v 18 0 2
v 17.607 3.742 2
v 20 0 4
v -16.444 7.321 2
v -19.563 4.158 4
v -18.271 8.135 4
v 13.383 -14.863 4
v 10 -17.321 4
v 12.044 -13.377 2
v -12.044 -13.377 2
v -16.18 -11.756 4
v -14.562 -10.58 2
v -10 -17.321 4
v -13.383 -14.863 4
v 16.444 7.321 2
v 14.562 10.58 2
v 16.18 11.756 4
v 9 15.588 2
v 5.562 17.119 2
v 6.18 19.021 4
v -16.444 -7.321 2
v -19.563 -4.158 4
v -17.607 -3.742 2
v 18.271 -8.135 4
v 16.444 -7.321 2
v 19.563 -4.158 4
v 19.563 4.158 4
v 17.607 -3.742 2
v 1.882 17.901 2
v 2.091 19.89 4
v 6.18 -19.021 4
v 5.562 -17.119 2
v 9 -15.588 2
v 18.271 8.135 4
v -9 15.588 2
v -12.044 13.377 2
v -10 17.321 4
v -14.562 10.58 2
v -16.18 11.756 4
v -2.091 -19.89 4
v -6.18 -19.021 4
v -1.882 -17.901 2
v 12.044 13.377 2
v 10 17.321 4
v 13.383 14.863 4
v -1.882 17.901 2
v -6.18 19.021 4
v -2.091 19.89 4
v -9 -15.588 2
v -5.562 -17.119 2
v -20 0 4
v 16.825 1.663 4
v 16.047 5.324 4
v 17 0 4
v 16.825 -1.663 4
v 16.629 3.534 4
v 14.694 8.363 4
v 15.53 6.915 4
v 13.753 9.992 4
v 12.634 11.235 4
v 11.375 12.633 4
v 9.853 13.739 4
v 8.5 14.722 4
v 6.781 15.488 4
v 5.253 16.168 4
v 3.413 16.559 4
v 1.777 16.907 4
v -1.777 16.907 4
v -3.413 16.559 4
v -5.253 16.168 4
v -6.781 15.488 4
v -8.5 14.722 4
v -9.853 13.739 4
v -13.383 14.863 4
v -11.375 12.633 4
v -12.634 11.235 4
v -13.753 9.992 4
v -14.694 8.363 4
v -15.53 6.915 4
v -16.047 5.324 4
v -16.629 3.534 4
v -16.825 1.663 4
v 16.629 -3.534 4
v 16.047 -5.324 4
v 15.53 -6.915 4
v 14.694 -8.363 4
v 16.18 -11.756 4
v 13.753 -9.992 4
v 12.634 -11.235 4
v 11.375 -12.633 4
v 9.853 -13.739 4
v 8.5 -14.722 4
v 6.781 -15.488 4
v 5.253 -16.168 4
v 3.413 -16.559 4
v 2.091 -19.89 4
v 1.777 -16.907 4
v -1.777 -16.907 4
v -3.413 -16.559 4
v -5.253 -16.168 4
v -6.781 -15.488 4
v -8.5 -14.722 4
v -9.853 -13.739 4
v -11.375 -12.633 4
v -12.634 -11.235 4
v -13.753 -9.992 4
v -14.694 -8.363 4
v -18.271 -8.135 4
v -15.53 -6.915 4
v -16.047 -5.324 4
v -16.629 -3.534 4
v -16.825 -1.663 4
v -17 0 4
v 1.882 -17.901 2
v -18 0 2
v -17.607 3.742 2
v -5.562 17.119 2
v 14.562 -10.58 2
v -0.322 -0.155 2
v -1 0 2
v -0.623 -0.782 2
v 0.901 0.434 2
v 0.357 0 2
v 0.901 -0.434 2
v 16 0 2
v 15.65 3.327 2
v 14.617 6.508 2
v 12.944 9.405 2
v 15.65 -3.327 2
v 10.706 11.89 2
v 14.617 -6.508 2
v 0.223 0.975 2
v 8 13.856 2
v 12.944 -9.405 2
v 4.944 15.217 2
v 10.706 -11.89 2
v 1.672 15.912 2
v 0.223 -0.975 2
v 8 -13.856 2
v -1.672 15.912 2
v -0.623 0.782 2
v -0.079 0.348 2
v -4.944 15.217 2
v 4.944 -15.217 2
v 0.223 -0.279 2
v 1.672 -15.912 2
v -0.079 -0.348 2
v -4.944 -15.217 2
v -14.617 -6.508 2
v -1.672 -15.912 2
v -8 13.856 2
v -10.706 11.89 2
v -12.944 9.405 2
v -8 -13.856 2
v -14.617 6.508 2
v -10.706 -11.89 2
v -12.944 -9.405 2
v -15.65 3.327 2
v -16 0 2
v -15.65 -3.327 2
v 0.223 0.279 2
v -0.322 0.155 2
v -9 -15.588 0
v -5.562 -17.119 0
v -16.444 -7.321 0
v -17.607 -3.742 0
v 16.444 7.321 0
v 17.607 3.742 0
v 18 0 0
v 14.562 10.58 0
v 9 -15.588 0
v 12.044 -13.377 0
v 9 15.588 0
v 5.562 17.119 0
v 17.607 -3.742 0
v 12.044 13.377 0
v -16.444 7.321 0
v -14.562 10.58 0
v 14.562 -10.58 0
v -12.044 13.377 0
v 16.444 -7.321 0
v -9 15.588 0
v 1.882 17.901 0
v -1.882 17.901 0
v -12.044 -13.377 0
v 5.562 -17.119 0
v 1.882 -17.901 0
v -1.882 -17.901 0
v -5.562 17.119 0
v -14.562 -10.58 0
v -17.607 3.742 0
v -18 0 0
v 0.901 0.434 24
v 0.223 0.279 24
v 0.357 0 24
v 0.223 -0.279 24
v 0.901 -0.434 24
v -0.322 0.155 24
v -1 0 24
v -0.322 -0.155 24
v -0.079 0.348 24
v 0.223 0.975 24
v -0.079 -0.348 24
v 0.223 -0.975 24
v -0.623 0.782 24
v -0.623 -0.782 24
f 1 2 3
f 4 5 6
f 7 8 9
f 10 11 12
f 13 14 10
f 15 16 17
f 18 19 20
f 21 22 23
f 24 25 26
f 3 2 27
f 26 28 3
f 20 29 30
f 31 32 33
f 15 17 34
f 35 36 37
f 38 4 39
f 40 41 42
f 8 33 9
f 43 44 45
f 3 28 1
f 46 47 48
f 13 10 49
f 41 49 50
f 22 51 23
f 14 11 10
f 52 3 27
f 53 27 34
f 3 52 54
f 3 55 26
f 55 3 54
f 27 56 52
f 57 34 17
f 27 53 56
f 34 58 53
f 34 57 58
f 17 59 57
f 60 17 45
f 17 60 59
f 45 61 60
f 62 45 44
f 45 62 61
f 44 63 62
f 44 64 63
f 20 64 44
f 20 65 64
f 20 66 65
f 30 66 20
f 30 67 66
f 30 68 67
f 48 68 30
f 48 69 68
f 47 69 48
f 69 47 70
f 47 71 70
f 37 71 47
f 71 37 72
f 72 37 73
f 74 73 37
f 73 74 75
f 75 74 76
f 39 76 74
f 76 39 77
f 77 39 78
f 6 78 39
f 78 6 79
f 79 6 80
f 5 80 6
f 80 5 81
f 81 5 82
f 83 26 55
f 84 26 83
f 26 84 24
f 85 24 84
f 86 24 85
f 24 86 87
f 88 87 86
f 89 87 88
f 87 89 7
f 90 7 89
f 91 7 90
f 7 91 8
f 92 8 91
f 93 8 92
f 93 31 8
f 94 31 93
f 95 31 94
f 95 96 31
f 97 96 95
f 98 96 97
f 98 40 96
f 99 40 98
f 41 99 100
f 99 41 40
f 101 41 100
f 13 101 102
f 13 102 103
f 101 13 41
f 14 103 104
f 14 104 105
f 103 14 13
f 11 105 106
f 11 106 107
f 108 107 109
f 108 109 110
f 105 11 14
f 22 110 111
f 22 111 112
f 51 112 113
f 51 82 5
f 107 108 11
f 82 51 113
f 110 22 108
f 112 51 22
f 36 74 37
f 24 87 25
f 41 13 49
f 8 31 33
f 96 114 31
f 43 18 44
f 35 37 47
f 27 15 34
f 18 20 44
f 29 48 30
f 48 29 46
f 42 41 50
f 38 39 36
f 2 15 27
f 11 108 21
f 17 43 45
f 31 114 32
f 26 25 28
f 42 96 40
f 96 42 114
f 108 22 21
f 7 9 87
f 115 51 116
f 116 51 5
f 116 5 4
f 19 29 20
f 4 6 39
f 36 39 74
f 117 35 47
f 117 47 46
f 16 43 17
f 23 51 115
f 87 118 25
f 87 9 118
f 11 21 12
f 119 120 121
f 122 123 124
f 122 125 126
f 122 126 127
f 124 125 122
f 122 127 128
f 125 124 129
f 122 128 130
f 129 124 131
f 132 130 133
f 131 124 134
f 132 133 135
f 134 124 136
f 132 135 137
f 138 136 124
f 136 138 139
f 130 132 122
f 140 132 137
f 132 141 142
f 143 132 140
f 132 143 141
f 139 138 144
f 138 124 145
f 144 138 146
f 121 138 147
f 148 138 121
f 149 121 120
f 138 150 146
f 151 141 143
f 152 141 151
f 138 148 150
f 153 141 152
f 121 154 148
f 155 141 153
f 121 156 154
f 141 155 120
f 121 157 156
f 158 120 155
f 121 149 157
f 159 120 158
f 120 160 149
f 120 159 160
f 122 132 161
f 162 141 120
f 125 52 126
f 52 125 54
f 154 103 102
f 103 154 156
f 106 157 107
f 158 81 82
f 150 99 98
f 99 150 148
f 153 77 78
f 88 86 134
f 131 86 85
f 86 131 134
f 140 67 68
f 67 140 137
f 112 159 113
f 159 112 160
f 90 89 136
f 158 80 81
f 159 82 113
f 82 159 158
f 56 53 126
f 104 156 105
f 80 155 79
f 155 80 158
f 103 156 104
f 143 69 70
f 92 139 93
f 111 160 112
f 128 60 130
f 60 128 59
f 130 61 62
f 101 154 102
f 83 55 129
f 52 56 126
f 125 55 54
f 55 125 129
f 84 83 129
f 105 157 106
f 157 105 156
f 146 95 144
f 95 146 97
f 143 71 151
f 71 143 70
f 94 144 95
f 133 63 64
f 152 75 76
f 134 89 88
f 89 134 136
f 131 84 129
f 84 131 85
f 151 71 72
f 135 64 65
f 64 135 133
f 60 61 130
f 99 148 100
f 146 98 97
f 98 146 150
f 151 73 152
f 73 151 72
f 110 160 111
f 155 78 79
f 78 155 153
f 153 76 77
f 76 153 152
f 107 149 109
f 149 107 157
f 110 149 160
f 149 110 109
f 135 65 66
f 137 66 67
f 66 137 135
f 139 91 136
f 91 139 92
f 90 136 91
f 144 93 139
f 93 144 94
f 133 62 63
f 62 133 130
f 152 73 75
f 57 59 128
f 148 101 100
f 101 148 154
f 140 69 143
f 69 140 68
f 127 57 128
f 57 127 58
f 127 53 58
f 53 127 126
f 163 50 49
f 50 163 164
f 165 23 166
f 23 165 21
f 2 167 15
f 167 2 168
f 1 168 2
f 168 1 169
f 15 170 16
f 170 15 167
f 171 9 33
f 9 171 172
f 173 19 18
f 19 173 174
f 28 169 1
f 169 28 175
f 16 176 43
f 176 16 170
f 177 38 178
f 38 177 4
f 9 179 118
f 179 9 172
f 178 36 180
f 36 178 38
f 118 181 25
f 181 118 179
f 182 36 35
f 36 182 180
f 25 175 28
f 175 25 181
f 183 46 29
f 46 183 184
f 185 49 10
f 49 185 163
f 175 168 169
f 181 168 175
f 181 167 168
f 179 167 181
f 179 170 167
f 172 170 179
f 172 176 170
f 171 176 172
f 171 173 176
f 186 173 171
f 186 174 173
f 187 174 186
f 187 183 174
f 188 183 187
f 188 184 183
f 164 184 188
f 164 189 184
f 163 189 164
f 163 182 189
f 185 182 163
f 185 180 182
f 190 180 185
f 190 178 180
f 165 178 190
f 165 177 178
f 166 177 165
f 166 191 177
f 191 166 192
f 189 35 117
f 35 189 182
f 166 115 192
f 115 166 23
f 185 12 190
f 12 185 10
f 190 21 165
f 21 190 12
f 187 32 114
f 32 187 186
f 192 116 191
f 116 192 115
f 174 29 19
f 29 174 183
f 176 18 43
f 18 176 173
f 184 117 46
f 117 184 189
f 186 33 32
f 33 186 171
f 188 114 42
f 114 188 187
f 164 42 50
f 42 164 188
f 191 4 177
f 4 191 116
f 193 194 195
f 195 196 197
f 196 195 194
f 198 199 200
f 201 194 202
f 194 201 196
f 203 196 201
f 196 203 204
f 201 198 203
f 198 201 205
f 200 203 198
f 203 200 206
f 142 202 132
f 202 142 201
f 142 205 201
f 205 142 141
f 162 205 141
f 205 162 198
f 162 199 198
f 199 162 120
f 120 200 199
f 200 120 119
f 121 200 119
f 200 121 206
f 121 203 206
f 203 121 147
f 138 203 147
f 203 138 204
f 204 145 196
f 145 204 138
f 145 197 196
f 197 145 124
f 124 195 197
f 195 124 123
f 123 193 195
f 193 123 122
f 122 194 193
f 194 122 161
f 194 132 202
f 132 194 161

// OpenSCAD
outerRadius = 16;
innerRadius = 14;
height = 2;
offset = 2;
starHeight = 24;
starRadius = 2;

module star(p, d1=0, d2=0, r1=0, r2=0) 
{ R1= r1!=0 ? r1: d1/2;
  D1= d1!=0 ? d1: 2*r1;
  R2= r2!=0 ? r2: d2/2;
  D2= d2!=0 ? d2: 2*r2;
  
  union()
  { for(i=[0:p-1])
    { i1=[cos(i*360/p - 180/p)*R1,sin(i*360/p - 180/p )*R1]; //first inner point
      i2=[cos(i*360/p + 180/p)*R1,sin(i*360/p + 180/p)*R1]; //second inner point
      i3=[cos(i*360/p + 180)*R1,sin(i*360/p + 180)*R1];      //third inner point
      o=[cos(i*360/p)*R2,sin(i*360/p)*R2];                           //outer point
      polygon([i1,o,i2,i3],[[0,1,2,3]]);
    }
  }
}

cylinder(height, (outerRadius + offset), (outerRadius + offset), false);
translate([0, 0, height])
    difference() {
        cylinder(height, (outerRadius + offset), (outerRadius + (2 * offset)), false);
        cylinder((height + offset), outerRadius, (outerRadius + offset), false);
    }

linear_extrude(starHeight, true)
    star(7, starRadius);   
